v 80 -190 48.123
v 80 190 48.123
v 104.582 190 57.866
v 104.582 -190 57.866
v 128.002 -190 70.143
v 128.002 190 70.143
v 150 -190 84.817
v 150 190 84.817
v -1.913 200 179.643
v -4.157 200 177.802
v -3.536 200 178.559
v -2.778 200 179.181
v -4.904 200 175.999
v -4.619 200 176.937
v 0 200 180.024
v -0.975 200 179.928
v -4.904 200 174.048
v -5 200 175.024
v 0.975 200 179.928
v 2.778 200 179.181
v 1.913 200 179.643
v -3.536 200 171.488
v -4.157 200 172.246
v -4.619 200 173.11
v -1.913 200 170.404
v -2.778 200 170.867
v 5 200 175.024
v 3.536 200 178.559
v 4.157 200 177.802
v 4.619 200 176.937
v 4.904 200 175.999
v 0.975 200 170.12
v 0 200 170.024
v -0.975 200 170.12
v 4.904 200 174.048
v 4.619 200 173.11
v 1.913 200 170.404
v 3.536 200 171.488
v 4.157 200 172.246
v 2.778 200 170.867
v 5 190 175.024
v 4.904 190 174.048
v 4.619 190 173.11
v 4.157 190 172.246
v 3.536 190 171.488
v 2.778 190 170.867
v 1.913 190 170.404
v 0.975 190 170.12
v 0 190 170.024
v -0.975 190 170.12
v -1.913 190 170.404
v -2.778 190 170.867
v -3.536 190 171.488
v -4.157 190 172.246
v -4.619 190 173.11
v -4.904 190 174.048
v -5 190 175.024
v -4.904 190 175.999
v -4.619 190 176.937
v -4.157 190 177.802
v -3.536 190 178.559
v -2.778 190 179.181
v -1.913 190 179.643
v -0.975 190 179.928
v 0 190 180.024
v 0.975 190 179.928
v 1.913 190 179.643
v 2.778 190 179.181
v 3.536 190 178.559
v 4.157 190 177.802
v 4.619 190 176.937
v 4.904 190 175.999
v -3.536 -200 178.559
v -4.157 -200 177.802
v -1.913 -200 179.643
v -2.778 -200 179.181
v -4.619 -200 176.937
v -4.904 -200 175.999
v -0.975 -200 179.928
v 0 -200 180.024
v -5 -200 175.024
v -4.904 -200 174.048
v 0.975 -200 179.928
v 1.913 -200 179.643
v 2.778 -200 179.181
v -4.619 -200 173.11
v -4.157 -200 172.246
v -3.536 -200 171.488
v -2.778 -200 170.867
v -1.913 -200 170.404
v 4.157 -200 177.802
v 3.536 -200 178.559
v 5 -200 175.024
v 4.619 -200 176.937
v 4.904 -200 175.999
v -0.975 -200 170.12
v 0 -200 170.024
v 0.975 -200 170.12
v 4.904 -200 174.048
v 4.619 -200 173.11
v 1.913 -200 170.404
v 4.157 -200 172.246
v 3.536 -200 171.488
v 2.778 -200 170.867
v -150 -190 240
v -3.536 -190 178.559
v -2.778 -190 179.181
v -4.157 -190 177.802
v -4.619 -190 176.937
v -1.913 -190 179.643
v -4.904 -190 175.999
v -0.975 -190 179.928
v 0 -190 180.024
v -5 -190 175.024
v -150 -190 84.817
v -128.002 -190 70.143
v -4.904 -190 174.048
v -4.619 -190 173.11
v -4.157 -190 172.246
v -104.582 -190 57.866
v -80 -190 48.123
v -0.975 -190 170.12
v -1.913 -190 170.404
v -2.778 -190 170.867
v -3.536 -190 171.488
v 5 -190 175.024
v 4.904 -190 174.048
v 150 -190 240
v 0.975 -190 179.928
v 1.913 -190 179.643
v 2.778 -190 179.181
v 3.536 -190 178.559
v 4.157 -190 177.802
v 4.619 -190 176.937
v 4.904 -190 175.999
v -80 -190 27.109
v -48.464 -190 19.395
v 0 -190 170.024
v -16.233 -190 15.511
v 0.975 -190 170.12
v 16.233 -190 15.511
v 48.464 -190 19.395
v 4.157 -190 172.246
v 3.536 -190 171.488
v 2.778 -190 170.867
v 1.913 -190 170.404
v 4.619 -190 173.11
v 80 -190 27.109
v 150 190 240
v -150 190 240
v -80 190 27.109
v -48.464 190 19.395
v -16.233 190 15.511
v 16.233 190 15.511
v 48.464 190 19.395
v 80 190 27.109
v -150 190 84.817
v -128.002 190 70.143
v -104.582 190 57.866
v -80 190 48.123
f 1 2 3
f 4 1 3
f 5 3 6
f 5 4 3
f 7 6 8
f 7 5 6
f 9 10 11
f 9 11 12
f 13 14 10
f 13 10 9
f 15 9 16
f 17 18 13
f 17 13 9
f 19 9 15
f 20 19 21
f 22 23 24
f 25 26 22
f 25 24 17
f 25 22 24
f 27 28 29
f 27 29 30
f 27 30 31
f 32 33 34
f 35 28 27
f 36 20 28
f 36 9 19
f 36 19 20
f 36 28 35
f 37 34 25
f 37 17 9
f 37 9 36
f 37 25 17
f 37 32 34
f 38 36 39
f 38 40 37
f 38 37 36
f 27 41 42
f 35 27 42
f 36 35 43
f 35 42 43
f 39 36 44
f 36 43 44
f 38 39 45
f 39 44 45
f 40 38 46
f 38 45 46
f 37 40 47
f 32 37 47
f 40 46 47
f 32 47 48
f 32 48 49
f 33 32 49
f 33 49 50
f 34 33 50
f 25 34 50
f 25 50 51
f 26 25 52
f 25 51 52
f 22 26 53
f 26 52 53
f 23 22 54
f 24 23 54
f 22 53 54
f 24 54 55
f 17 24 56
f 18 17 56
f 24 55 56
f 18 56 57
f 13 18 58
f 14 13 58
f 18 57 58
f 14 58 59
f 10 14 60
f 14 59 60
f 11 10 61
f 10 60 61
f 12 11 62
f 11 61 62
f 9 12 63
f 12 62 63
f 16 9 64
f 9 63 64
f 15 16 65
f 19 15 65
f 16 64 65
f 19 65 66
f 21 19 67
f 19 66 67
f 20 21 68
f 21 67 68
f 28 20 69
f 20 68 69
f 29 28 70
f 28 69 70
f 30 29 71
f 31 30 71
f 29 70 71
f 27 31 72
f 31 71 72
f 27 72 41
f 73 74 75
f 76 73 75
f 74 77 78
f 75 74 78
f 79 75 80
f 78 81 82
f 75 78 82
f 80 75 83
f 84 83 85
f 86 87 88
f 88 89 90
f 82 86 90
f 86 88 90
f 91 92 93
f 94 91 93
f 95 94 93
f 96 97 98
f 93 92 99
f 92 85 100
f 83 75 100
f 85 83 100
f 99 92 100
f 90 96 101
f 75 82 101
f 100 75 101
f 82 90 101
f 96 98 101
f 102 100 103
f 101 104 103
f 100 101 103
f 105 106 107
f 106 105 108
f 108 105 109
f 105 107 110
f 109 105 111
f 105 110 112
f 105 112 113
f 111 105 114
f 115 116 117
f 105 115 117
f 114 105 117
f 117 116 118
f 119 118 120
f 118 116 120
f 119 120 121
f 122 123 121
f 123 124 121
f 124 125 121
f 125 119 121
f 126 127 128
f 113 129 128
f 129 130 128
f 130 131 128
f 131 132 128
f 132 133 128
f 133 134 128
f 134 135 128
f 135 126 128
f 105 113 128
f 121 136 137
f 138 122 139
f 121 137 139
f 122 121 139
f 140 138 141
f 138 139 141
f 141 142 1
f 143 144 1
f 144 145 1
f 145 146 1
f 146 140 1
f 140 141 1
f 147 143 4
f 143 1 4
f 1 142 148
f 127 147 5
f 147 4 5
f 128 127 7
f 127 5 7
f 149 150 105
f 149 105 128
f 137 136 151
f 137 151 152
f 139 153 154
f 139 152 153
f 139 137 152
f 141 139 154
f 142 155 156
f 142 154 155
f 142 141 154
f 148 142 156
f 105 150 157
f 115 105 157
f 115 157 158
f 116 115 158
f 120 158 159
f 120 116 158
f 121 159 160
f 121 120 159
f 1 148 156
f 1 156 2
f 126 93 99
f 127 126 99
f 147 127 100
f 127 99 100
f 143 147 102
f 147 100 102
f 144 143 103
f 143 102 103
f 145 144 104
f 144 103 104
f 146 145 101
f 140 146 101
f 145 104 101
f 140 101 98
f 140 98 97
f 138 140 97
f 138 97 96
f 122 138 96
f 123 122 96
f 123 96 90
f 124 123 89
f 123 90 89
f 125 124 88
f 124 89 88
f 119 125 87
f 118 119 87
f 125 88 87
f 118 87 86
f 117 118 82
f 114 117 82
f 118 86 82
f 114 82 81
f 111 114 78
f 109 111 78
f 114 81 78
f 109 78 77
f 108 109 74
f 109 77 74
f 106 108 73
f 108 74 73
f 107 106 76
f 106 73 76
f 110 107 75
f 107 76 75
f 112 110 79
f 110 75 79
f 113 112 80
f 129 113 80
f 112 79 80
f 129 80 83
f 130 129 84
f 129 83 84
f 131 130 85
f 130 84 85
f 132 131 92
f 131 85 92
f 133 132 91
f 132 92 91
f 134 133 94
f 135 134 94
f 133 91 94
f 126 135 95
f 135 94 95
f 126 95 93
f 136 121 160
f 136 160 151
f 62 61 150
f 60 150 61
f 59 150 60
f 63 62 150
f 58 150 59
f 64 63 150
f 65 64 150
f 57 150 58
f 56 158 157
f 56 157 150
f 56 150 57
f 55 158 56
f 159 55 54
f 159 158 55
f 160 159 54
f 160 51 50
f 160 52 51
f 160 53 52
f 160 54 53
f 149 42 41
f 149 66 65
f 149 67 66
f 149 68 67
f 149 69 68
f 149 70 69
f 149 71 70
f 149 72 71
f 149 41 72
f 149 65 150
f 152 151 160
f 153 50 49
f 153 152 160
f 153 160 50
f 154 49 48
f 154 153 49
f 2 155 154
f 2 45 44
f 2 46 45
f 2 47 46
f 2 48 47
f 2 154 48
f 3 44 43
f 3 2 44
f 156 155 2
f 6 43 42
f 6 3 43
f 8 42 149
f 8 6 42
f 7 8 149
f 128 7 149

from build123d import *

# Parameters (mm, degrees)
SKETCH1_W           = 340
SKETCH1_H           = 400
BOSS_EXTRUDE1_DEPTH = 240
CAVITY2_START       = -200
CAVITY2_DEPTH       = 400
CAVITY2_2_OUTLINE_R = 5
CAVITY2_2_DEPTH     = 10
CAVITY2_START_2     = 190
CAVITY2_3_OUTLINE_R = 5
CAVITY2_3_DEPTH     = 10


# Read off the part's stored shape, not the designer's step: Cavity2
with BuildPart() as part:
    # Sketch1 → Boss-Extrude1 (new body)
    with BuildSketch(Plane.XY):
        Rectangle(SKETCH1_W, SKETCH1_H)
    extrude(amount=BOSS_EXTRUDE1_DEPTH)

    # Cavity2 outline → Cavity2 (cut)
    with BuildSketch(Plane(origin=(0, 0, 0), x_dir=(1, 0, 0), z_dir=(0, 1, 0)).offset(CAVITY2_START)):
        with BuildLine():
            Line((-80, -48.123427946), (-80, -27.108908401))
            ThreePointArc((-80, -27.108908401), (0, -15.02389766), (80, -27.108908401))
            Line((80, -27.108908401), (80, -48.123427946))
            ThreePointArc((80, -48.123427946), (116.45426588, -63.695656752), (150, -84.816535832))
            Line((150, -84.816535832), (150, -240))
            Line((150, -240), (170, -240))
            Line((170, -240), (170, 0))
            Line((170, 0), (-170, 0))
            Line((-170, 0), (-170, -240))
            Line((-170, -240), (-150, -240))
            Line((-150, -240), (-150, -84.816535832))
            ThreePointArc((-150, -84.816535832), (-116.45426588, -63.695656752), (-80, -48.123427946))
        make_face()
    extrude(amount=CAVITY2_DEPTH, mode=Mode.SUBTRACT)

    # Cavity2 2 outline → Cavity2 2 (cut)
    with BuildSketch(Plane(origin=(0, 0, 0), x_dir=(1, 0, 0), z_dir=(0, 1, 0)).offset(CAVITY2_START)):
        with BuildLine():
            ThreePointArc((80, -27.108908401), (0, -15.02389766), (-80, -27.108908401))
            Line((-80, -27.108908401), (-80, -48.123427946))
            ThreePointArc((-80, -48.123427946), (-116.45426588, -63.695656752), (-150, -84.816535832))
            Line((-150, -84.816535832), (-150, -240))
            Line((-150, -240), (150, -240))
            Line((150, -240), (150, -84.816535832))
            ThreePointArc((150, -84.816535832), (116.45426588, -63.695656752), (80, -48.123427946))
            Line((80, -48.123427946), (80, -27.108908401))
        make_face()
        with Locations((0, -175.02389766)):
            Circle(CAVITY2_2_OUTLINE_R, mode=Mode.SUBTRACT)
    extrude(amount=CAVITY2_2_DEPTH, mode=Mode.SUBTRACT)

    # Cavity2 3 outline → Cavity2 3 (cut)
    with BuildSketch(Plane(origin=(0, 0, 0), x_dir=(1, 0, 0), z_dir=(0, 1, 0)).offset(CAVITY2_START_2)):
        with BuildLine():
            ThreePointArc((80, -27.108908401), (0, -15.02389766), (-80, -27.108908401))
            Line((-80, -27.108908401), (-80, -48.123427946))
            ThreePointArc((-80, -48.123427946), (-116.45426588, -63.695656752), (-150, -84.816535832))
            Line((-150, -84.816535832), (-150, -240))
            Line((-150, -240), (150, -240))
            Line((150, -240), (150, -84.816535832))
            ThreePointArc((150, -84.816535832), (116.45426588, -63.695656752), (80, -48.123427946))
            Line((80, -48.123427946), (80, -27.108908401))
        make_face()
        with Locations((0, -175.02389766)):
            Circle(CAVITY2_3_OUTLINE_R, mode=Mode.SUBTRACT)
    extrude(amount=CAVITY2_3_DEPTH, mode=Mode.SUBTRACT)


solid = part.part
